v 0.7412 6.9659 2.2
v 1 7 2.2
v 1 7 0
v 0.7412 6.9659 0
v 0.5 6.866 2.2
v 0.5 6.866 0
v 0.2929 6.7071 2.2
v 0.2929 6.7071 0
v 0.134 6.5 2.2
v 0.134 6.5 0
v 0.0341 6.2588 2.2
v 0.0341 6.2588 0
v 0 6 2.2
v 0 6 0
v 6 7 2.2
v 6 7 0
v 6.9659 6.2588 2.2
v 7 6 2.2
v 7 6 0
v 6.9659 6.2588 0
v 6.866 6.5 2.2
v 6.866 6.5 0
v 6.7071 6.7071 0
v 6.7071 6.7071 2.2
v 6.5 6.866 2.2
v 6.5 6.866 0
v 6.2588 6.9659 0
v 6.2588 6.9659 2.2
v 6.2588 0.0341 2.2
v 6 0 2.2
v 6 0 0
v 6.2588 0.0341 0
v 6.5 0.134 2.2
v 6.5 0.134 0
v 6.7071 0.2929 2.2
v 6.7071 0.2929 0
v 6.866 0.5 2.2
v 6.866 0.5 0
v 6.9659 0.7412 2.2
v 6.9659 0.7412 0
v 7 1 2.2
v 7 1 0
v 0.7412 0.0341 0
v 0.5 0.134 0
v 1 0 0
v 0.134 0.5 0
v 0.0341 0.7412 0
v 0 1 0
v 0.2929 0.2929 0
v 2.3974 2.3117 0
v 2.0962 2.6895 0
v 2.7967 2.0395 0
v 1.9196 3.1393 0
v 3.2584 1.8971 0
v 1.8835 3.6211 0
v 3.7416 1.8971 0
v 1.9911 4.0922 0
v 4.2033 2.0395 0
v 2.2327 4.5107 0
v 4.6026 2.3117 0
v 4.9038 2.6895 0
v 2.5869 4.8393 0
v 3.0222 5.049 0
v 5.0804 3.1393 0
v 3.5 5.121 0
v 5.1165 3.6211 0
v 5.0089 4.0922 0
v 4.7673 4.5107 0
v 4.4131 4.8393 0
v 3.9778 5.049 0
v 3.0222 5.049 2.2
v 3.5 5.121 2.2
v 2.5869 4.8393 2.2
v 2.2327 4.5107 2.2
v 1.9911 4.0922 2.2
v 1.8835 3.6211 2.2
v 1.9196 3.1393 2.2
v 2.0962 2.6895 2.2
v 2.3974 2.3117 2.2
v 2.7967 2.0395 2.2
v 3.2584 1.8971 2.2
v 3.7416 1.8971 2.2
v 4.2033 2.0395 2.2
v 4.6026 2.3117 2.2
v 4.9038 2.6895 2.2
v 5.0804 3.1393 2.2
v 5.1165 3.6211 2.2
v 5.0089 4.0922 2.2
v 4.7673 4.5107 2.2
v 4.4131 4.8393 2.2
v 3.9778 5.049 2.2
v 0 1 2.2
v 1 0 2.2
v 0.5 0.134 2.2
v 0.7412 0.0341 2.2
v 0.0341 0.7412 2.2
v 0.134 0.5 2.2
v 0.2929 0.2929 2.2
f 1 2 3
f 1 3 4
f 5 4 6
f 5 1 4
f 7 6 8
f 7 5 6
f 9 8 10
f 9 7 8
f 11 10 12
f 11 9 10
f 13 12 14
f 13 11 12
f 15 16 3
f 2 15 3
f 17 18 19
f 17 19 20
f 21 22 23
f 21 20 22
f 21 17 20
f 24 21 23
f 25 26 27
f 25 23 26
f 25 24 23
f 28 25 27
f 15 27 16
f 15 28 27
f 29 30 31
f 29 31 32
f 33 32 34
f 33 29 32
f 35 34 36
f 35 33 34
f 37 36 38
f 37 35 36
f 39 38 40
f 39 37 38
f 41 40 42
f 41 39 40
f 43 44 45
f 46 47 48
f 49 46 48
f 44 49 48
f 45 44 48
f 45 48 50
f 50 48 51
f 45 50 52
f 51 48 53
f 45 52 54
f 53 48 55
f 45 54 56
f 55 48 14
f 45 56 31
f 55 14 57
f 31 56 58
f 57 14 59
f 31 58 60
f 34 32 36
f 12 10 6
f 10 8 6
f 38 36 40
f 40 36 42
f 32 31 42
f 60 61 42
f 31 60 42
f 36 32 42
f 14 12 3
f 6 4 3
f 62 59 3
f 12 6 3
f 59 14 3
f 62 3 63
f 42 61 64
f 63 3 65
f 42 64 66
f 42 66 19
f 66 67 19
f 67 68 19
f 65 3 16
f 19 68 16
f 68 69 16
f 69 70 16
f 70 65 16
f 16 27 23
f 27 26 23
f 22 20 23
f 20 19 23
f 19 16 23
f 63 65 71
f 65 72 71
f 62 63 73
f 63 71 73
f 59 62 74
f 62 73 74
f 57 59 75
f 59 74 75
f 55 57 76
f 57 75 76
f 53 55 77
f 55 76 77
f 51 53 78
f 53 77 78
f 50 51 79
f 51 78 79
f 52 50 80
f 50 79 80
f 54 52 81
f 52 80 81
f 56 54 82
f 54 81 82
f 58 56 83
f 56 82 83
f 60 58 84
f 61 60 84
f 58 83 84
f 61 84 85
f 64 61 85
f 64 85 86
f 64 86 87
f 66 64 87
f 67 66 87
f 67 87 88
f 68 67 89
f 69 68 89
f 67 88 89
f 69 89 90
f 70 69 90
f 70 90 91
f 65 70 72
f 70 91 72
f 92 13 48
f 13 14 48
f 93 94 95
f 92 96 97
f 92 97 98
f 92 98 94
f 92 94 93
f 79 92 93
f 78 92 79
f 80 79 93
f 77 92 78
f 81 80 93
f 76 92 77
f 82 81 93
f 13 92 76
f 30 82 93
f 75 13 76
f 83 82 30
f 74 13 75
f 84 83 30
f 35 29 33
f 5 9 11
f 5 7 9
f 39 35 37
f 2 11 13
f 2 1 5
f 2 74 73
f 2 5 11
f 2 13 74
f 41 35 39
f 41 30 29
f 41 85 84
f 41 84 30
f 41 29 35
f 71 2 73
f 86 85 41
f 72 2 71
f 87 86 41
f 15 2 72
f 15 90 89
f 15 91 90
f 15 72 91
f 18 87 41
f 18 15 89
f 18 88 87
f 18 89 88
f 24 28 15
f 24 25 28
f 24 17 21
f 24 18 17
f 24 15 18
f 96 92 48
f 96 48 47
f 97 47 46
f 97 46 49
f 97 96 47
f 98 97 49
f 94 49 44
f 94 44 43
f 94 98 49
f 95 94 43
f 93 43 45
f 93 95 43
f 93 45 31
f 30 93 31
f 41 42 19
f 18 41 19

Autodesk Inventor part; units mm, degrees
ref_plane "YZ Plane" through (0, 0, 0) normal (1, 0, 0) x (0, 1, 0)
ref_plane "XZ Plane" through (0, 0, 0) normal (0, 1, 0) x (-1, 0, 0)
ref_plane "XY Plane" through (0, 0, 0) normal (0, 0, 1) x (1, 0, 0)
sketch "Skizze3" plane through (0, 0, 0) normal (0, 0, 1) x (1, 0, 0)
  line L0 (0, 0) -> (7, 0)
  line L1 (7, 0) -> (7, 7)
  line L2 (7, 7) -> (0, 7)
  line L3 (0, 7) -> (0, 0)
  point P0 (3.5, 3.5)
  point P1 (3.5, 7)
  point P2 (0, 3.5)
  dimension "d4" = 7
  dimension "d5" = 7
extrude "Extrusion3" add sketch "Skizze3" along normal blind 2.2
fillet "Rundung1" radius 1 4 edges at (7, 7, 1.1) (0, 7, 1.1) (0, 0, 1.1) (7, 0, 1.1)
hole "Bohrung1" at (3.5, 3.5, 0) direction (0, 0, 1) diameter 3.242 depth 11.8 thread size "M4x0.7" class "6H" standard "ISO Metric profile"
equation "\"d5\" = d4"
properties part number "BT004_trajan20_22"
